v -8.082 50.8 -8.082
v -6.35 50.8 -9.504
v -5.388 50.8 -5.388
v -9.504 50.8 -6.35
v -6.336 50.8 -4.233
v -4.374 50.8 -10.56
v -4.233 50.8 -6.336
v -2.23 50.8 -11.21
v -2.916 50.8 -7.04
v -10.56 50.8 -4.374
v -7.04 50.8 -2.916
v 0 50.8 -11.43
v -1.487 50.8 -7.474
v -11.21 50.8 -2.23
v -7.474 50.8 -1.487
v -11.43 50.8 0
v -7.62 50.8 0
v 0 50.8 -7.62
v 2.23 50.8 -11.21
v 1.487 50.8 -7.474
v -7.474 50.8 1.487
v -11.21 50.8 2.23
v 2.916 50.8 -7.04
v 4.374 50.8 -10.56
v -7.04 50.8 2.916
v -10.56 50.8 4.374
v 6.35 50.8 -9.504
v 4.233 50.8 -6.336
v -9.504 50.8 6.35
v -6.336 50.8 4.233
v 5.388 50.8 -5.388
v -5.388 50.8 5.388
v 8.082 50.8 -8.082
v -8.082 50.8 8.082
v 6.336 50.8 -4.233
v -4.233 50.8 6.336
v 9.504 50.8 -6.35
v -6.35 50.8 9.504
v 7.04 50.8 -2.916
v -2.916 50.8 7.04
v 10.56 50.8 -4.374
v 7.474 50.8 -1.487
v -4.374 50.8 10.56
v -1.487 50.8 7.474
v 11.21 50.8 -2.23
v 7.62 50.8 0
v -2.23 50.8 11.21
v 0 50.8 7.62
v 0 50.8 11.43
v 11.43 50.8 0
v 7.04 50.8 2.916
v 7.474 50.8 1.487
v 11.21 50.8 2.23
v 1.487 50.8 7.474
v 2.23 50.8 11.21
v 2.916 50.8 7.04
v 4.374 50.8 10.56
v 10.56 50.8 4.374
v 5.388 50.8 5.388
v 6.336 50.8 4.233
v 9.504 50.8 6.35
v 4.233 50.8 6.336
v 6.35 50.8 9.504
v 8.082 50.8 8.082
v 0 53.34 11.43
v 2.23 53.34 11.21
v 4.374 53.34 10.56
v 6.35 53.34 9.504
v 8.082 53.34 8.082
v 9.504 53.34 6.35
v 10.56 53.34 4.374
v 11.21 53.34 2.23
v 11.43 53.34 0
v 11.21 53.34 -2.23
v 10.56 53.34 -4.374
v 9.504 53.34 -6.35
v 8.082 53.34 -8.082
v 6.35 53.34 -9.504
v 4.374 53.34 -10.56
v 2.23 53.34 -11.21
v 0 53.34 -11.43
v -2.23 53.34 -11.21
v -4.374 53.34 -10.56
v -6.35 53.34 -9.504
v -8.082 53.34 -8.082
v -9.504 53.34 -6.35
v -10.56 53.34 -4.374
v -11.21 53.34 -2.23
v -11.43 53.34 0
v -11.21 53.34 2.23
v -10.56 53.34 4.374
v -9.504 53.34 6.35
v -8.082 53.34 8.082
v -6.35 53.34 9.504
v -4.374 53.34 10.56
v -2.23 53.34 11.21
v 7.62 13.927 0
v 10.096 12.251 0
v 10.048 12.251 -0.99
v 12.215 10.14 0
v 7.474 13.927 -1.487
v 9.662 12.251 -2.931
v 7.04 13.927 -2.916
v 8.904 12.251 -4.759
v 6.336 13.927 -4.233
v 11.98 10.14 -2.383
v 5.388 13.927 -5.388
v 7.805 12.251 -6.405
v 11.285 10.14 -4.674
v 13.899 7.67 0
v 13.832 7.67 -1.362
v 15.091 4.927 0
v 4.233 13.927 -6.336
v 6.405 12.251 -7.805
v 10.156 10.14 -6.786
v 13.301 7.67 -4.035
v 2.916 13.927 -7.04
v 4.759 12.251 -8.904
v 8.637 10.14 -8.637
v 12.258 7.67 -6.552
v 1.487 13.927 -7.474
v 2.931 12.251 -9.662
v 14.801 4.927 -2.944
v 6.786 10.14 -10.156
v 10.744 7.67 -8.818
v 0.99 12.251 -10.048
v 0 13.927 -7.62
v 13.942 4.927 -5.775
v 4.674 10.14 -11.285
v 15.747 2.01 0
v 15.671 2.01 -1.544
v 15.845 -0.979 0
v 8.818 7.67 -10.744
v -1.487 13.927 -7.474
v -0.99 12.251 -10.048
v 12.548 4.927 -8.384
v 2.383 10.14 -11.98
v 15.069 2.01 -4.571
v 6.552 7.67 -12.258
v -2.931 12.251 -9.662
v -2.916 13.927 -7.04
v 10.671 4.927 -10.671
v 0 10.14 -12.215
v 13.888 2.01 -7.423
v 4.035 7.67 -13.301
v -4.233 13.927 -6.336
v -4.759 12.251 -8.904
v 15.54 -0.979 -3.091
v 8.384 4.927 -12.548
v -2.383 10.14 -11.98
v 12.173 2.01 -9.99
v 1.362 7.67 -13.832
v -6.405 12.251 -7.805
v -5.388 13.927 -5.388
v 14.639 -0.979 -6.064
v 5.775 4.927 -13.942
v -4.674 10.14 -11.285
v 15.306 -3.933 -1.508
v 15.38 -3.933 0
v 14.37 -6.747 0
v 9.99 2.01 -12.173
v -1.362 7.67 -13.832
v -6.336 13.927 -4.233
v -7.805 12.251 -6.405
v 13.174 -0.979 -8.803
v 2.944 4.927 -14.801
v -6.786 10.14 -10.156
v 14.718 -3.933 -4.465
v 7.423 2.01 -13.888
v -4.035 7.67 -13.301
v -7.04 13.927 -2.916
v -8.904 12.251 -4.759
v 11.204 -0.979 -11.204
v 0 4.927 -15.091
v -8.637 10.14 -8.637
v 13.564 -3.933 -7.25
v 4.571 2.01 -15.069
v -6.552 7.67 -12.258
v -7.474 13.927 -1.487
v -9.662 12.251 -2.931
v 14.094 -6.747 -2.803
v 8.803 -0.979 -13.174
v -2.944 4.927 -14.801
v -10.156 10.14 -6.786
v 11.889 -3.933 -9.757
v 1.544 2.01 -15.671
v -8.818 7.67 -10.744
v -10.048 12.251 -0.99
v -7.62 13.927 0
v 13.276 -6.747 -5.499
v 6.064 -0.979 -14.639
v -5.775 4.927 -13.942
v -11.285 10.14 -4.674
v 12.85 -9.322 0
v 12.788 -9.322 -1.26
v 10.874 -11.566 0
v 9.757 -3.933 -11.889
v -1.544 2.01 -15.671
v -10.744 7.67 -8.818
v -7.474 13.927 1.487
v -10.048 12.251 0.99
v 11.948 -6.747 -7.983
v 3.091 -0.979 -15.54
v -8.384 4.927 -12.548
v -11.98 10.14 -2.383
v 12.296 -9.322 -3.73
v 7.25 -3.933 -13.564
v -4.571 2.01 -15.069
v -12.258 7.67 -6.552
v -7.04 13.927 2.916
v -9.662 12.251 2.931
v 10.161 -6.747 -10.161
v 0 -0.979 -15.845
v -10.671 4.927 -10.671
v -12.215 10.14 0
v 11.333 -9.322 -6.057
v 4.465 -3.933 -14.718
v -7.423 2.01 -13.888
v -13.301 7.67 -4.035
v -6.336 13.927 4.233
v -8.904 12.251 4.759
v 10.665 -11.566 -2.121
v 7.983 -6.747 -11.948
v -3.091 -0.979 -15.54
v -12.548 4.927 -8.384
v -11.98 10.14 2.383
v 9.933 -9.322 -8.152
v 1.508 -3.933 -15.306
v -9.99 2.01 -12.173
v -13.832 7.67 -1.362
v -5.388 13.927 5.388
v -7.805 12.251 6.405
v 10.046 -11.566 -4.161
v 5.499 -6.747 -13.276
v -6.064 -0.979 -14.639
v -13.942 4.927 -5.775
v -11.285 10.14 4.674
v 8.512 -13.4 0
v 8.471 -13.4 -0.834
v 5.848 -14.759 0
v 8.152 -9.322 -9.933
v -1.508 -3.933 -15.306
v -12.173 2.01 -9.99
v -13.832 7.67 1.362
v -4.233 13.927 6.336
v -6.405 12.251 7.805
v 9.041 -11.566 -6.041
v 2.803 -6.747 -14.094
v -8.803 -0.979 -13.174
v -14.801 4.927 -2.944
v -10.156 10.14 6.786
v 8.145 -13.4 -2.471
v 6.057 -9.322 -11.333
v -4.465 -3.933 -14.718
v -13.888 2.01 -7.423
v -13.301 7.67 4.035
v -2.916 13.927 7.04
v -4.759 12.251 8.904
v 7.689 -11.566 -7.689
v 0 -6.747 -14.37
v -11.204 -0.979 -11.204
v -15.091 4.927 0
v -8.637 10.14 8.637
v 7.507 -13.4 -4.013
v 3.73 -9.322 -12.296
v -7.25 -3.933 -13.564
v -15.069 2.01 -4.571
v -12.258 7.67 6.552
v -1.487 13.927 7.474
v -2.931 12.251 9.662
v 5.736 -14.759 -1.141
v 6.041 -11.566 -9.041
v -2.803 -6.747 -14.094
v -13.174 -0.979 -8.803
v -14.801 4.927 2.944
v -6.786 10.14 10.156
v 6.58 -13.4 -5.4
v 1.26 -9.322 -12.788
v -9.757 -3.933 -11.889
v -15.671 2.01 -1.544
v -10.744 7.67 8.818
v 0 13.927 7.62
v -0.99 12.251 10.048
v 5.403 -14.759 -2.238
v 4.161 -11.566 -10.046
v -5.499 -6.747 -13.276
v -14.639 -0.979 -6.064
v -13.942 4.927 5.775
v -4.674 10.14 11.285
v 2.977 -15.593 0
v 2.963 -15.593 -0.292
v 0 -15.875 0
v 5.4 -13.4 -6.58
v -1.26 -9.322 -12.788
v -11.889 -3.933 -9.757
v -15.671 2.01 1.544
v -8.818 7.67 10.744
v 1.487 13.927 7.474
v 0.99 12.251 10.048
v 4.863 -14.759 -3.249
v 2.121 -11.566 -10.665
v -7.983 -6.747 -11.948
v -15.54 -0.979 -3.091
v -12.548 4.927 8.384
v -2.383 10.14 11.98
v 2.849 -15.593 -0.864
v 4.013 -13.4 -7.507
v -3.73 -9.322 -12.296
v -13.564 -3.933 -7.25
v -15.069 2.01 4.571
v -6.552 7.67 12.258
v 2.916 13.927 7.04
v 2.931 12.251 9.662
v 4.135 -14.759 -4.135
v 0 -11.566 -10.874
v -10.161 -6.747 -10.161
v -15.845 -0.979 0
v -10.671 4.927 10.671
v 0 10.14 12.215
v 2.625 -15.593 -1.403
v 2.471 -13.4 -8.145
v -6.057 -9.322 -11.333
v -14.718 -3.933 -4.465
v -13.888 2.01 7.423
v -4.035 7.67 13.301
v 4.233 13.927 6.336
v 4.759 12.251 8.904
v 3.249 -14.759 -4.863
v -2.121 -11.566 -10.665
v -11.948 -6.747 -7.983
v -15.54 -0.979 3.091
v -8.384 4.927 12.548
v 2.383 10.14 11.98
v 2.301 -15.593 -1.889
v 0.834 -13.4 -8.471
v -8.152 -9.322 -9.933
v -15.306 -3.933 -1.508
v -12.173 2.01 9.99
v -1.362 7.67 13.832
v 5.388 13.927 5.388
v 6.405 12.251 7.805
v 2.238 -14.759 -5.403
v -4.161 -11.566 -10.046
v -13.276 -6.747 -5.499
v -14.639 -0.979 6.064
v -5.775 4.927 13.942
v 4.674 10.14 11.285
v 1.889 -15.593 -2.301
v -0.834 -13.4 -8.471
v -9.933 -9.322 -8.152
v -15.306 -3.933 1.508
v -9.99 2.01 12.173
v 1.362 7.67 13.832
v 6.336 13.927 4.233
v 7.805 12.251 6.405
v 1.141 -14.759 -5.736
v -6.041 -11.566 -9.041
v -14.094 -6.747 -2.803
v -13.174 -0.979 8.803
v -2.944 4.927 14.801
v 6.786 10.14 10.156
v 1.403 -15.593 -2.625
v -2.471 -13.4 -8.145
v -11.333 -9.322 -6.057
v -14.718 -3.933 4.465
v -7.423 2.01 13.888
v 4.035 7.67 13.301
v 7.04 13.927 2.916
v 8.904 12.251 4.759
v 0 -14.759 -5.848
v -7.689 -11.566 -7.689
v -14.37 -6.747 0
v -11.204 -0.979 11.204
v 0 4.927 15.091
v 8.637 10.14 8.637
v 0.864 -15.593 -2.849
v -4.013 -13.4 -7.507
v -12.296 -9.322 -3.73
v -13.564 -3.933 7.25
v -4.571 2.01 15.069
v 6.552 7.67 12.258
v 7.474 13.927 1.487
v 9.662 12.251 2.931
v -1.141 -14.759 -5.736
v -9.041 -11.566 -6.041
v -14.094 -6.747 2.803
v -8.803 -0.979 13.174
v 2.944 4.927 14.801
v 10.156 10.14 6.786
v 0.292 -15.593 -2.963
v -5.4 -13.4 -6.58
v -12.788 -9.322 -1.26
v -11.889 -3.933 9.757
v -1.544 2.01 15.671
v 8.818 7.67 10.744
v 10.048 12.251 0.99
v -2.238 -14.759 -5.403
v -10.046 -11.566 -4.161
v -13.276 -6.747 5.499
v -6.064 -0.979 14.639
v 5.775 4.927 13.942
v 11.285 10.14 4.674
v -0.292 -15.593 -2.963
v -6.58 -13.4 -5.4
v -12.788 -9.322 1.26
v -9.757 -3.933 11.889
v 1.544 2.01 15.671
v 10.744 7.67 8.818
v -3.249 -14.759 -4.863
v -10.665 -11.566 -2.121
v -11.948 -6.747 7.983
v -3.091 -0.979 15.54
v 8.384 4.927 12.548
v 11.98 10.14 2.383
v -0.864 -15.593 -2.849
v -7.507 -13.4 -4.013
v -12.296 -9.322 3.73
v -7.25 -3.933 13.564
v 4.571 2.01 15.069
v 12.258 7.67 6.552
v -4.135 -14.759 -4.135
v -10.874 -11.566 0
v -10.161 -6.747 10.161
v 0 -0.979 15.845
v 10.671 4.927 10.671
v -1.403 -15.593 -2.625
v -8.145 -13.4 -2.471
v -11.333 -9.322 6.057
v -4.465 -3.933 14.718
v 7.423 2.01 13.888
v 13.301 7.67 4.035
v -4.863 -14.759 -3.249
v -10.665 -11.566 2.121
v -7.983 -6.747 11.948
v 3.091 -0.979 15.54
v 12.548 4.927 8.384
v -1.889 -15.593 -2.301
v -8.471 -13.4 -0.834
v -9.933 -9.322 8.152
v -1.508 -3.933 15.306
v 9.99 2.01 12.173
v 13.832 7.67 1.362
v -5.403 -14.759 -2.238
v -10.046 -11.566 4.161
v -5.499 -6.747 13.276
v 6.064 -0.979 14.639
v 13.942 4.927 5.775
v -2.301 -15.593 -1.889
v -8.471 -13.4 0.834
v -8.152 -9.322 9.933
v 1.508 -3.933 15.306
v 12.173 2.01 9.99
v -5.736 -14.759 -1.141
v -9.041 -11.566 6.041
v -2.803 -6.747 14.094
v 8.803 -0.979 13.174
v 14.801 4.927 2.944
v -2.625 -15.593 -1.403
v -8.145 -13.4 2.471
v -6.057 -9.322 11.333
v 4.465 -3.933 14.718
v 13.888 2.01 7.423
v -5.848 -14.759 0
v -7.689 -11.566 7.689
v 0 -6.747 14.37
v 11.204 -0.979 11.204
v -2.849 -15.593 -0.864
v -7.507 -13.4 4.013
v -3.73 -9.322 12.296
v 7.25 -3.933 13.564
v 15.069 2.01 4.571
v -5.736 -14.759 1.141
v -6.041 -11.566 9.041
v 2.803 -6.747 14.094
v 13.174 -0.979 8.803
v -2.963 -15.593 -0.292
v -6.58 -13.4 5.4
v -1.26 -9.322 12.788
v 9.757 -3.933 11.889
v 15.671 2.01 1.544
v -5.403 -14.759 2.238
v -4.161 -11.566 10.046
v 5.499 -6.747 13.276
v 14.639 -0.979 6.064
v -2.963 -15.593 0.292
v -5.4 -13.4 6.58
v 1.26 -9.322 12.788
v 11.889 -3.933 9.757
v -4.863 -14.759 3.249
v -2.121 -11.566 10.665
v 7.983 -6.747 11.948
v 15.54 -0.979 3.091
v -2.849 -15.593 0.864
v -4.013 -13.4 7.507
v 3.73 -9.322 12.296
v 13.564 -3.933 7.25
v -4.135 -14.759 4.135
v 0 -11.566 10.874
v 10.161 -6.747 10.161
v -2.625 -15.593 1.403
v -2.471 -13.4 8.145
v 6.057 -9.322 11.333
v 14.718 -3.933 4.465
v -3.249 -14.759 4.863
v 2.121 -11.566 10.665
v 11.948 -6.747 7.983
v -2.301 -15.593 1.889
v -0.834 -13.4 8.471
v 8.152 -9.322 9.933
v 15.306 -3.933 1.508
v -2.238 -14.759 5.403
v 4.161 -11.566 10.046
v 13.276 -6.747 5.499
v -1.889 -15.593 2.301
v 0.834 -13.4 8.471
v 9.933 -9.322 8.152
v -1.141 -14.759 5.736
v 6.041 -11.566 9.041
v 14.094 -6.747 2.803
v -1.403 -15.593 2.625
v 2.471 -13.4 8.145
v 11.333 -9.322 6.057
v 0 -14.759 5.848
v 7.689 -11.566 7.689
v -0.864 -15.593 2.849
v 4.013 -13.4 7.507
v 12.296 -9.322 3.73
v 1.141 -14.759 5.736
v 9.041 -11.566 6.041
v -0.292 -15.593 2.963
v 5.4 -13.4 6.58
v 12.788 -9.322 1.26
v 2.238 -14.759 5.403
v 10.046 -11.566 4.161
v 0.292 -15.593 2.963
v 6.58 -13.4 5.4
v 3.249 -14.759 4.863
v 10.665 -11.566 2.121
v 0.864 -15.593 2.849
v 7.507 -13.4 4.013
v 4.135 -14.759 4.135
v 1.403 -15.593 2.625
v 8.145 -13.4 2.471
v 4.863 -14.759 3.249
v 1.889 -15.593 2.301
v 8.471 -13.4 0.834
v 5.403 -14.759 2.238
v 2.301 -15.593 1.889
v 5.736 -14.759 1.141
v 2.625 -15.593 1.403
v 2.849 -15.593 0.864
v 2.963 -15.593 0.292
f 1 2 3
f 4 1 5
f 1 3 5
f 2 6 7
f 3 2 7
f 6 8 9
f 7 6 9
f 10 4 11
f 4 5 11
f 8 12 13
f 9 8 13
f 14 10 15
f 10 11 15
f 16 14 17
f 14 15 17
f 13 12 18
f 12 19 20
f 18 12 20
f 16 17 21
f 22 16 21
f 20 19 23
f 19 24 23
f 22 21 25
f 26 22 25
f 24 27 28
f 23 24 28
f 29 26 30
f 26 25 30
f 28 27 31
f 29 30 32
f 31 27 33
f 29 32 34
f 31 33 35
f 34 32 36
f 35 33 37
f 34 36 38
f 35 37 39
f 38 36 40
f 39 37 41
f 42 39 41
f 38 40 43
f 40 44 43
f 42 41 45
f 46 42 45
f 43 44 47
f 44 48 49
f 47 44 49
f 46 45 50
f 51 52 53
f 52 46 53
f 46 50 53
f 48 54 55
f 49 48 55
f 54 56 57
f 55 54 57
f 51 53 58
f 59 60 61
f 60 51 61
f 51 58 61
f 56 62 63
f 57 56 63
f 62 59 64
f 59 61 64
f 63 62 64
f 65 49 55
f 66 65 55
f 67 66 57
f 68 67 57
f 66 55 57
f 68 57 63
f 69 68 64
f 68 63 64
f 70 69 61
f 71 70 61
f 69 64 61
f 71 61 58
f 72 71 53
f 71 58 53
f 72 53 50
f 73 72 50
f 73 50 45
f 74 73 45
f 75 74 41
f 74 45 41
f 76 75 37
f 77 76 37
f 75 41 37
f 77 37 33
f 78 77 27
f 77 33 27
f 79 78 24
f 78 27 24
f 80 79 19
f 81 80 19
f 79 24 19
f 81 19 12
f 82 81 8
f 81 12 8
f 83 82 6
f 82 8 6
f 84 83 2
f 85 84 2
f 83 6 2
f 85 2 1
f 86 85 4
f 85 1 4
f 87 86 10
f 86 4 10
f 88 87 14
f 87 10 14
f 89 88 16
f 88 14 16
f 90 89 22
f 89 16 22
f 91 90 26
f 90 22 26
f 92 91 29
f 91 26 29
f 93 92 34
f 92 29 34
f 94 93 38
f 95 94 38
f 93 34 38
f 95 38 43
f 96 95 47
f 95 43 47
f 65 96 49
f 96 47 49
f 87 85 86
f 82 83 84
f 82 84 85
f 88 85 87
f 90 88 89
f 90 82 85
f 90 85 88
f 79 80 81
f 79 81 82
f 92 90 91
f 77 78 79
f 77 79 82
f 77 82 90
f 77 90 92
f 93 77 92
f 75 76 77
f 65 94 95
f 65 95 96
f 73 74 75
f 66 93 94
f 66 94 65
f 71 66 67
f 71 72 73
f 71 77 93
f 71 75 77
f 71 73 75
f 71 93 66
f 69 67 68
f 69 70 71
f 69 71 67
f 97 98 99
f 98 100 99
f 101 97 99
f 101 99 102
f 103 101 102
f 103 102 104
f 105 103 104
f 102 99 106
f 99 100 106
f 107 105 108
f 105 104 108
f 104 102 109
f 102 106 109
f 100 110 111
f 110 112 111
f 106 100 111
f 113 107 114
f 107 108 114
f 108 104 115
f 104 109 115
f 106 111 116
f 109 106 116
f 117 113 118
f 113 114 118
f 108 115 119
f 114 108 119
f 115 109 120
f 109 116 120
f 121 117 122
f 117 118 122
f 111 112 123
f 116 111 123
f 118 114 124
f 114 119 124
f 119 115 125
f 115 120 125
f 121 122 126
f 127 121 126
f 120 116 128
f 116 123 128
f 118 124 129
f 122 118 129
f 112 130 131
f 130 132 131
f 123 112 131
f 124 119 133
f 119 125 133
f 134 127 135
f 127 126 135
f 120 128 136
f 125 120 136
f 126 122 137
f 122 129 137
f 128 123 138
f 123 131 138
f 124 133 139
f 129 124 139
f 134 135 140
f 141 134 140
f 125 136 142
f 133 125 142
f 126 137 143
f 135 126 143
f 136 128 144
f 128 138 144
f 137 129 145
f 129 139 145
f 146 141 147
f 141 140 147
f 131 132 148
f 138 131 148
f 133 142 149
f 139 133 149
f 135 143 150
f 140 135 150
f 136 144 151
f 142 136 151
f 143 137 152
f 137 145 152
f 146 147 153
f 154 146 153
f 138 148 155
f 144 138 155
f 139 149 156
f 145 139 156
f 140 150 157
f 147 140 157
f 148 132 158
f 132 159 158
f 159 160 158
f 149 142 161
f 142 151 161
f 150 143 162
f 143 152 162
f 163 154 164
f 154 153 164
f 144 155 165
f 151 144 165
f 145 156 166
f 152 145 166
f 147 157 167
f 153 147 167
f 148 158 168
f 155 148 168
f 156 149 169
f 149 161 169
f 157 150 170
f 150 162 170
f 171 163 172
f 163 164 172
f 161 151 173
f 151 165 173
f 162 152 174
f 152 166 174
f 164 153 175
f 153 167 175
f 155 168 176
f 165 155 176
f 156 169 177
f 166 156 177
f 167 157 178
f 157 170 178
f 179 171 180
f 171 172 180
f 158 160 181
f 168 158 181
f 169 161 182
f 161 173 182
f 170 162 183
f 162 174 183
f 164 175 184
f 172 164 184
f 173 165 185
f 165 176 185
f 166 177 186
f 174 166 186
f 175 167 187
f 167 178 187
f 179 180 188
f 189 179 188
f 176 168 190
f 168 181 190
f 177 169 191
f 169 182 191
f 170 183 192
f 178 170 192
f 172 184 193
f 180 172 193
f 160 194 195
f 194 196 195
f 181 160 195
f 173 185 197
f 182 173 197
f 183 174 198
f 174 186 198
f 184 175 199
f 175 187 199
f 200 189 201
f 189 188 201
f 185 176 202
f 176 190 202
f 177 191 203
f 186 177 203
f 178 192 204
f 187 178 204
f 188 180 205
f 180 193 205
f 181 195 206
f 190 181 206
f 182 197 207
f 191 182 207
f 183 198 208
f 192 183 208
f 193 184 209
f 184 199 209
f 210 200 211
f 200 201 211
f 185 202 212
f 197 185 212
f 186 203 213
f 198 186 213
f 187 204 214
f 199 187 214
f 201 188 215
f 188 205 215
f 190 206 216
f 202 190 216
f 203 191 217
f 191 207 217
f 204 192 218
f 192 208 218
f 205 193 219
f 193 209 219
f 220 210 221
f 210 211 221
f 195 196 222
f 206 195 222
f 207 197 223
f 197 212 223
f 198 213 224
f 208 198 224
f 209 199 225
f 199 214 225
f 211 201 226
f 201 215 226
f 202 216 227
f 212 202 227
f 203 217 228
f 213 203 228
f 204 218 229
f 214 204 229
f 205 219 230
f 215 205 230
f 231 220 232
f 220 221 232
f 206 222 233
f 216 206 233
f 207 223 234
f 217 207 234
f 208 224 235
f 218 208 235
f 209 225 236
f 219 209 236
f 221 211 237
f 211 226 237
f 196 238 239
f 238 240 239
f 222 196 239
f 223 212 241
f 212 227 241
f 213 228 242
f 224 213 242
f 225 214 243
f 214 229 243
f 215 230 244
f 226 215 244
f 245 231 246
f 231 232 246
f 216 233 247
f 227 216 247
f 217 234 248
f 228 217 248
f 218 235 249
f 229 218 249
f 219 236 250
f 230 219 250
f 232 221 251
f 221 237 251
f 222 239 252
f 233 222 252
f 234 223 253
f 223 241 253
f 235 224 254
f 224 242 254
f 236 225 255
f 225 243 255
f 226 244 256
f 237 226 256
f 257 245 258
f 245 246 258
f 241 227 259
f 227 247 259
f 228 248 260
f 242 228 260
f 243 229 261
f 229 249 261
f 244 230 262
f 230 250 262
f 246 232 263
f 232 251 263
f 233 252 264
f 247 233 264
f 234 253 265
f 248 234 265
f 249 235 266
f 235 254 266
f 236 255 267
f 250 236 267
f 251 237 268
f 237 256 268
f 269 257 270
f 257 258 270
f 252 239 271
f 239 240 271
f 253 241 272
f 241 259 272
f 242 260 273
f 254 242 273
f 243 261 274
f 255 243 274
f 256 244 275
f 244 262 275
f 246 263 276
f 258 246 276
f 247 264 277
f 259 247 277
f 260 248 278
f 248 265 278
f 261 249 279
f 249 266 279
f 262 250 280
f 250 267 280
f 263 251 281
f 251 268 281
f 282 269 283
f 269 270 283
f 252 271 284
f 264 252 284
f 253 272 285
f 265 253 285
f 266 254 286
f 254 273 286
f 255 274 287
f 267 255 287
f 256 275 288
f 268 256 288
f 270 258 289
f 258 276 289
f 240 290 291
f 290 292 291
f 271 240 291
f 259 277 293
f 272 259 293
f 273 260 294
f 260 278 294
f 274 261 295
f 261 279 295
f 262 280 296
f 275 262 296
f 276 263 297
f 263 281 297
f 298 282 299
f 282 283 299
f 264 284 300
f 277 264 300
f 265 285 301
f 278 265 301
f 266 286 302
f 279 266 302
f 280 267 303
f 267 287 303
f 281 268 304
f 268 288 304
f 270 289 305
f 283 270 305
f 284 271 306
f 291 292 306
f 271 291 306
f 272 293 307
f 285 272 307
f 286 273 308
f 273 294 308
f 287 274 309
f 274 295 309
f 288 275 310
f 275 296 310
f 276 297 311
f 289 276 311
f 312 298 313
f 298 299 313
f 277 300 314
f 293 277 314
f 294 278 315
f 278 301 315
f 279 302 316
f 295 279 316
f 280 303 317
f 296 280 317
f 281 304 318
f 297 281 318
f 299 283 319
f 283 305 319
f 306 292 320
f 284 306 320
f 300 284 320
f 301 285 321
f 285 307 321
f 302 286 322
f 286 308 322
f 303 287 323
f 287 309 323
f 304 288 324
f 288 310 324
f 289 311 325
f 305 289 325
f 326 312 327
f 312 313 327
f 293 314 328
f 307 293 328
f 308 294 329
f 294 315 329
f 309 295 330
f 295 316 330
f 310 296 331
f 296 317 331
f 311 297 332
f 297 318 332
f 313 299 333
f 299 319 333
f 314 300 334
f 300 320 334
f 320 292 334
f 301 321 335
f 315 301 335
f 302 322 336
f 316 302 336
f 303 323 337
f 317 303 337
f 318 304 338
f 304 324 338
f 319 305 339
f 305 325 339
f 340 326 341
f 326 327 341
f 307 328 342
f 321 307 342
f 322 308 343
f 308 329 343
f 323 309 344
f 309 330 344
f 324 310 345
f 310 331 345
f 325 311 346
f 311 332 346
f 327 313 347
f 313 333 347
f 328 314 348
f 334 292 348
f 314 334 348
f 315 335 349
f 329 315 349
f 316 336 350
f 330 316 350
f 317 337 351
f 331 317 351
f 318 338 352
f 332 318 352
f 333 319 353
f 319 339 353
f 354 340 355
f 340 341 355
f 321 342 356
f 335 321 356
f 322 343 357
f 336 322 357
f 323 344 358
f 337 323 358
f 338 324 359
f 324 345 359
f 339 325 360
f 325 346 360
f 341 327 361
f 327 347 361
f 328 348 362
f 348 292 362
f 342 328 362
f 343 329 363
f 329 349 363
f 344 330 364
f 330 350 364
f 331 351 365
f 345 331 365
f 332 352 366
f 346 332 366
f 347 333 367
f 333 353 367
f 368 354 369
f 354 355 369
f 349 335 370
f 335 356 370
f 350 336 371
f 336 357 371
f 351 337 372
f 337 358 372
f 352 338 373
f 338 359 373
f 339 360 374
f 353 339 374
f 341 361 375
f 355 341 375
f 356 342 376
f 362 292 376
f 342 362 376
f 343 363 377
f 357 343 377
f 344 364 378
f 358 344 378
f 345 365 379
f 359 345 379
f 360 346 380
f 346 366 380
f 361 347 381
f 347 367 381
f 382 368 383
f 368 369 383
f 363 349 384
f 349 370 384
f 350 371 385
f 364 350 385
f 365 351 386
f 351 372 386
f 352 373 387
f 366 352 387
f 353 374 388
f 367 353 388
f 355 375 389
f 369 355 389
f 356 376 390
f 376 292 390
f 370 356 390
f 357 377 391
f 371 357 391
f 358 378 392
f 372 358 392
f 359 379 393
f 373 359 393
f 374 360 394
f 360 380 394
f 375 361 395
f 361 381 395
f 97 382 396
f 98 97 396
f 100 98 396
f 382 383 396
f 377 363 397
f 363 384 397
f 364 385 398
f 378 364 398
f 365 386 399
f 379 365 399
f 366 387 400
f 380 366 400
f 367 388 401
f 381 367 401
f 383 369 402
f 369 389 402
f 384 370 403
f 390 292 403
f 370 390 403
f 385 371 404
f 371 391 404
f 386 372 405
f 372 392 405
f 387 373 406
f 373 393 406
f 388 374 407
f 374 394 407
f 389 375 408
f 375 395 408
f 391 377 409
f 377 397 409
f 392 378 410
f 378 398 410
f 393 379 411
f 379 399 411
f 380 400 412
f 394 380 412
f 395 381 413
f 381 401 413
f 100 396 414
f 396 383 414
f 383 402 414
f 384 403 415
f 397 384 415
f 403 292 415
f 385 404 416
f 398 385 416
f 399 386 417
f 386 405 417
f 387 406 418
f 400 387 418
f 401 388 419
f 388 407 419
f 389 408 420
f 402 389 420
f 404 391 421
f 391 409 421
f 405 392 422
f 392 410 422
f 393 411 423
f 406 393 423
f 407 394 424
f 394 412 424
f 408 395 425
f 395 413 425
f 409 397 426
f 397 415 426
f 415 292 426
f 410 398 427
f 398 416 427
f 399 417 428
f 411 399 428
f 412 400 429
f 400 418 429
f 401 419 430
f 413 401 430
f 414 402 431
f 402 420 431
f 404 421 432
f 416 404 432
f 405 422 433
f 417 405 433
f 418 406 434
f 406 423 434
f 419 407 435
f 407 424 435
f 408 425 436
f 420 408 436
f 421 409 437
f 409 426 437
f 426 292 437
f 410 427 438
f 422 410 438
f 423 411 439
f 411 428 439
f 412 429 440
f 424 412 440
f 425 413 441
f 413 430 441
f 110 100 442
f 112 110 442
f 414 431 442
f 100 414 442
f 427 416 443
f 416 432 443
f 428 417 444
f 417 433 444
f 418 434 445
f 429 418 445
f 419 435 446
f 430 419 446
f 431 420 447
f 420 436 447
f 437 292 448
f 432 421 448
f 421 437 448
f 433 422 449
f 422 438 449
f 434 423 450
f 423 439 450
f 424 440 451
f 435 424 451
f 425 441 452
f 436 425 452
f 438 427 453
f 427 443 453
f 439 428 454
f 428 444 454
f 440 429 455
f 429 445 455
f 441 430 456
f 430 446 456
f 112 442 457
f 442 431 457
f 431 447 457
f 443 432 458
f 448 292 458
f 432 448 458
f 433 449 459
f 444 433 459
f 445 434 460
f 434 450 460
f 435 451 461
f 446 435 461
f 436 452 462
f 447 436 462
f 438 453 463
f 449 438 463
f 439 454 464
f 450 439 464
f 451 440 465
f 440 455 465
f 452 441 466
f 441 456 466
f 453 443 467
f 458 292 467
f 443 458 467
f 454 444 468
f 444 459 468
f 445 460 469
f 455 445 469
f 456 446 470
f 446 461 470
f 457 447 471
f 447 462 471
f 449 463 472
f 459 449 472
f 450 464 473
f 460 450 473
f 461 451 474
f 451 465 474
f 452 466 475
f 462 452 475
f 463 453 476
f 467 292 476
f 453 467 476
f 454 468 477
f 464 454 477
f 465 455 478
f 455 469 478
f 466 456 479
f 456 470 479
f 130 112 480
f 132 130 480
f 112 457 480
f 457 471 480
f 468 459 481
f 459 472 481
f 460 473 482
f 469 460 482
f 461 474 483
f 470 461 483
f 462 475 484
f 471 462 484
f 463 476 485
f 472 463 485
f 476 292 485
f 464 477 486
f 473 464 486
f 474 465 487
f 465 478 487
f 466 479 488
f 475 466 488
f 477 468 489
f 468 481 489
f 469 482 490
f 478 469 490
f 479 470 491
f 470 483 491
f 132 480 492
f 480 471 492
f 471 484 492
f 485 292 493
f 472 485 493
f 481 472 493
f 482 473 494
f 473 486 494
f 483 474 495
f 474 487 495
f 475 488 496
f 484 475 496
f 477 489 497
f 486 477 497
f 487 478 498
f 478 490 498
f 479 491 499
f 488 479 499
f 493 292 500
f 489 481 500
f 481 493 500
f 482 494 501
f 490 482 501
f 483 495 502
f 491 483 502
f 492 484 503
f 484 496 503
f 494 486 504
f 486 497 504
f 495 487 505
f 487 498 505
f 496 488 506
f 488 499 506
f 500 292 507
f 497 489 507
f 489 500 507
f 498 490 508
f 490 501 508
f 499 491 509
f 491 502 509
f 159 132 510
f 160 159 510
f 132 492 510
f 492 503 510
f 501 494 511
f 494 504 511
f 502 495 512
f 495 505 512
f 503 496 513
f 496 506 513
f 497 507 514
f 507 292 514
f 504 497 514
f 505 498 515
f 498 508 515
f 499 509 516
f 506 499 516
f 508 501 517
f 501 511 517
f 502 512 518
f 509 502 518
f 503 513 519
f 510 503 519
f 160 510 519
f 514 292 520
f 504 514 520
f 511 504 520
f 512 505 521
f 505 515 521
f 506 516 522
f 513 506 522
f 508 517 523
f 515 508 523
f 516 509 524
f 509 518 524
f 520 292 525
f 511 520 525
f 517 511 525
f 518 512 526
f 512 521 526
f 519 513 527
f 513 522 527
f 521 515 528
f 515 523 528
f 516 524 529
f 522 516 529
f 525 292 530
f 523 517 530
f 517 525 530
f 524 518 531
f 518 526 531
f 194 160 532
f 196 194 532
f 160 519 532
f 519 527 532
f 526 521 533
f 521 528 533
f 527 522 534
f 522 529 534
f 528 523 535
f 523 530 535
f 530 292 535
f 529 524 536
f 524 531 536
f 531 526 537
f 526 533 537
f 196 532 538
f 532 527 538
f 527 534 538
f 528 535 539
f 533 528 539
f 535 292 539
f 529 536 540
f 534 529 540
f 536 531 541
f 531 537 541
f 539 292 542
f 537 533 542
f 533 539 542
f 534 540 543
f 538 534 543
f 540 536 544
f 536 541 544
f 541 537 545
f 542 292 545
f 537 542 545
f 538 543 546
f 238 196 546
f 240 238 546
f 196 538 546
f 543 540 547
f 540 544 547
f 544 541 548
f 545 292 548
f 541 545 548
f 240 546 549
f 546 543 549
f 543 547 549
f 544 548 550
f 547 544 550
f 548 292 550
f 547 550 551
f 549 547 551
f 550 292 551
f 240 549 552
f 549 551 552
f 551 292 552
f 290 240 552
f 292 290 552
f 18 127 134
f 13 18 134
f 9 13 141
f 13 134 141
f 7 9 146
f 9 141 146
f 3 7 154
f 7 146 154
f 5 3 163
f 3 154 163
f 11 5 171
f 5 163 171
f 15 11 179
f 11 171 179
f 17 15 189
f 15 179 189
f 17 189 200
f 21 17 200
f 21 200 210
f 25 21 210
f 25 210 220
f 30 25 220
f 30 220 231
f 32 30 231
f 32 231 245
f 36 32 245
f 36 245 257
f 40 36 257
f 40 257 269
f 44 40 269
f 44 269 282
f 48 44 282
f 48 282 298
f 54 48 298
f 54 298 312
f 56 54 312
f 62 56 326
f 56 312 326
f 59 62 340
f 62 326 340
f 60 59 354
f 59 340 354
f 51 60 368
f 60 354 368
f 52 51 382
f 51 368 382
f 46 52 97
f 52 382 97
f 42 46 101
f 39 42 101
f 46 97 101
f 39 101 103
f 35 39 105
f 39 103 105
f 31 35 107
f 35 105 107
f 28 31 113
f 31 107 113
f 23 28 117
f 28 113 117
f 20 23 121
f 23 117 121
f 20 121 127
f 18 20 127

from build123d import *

# Parameters (mm, degrees)
SKETCH2_R           = 7.62
BOSS_EXTRUDE1_DEPTH = 50.8
SKETCH3_R           = 11.43
BOSS_EXTRUDE2_DEPTH = 2.54


with BuildPart() as part:
    # Sketch1 → Revolve1 (revolve)
    with BuildSketch(Plane.XY):
        with BuildLine():
            Line((0, -15.875), (0, 15.875))
            ThreePointArc((0, 15.875), (15.875, 0), (0, -15.875))
        make_face()
    revolve(axis=Axis((0, -15.875, 0), (0, 1, 0)))

    # Sketch2 → Boss-Extrude1 (add)
    with BuildSketch(Plane(origin=(0, 0, 0), x_dir=(1, 0, 0), z_dir=(0, 1, 0))):
        with Locations(Location((0, 0, 0), (0, 0, 90))):
            Circle(SKETCH2_R)
    extrude(amount=BOSS_EXTRUDE1_DEPTH)

    # Sketch3 → Boss-Extrude2 (add)
    with BuildSketch(Plane(origin=(0, 50.8, 0), x_dir=(1, 0, 0), z_dir=(0, 1, 0))):
        with Locations(Location((0, 0, 0), (0, 0, 270))):
            Circle(SKETCH3_R)
    extrude(amount=BOSS_EXTRUDE2_DEPTH)


solid = part.part
